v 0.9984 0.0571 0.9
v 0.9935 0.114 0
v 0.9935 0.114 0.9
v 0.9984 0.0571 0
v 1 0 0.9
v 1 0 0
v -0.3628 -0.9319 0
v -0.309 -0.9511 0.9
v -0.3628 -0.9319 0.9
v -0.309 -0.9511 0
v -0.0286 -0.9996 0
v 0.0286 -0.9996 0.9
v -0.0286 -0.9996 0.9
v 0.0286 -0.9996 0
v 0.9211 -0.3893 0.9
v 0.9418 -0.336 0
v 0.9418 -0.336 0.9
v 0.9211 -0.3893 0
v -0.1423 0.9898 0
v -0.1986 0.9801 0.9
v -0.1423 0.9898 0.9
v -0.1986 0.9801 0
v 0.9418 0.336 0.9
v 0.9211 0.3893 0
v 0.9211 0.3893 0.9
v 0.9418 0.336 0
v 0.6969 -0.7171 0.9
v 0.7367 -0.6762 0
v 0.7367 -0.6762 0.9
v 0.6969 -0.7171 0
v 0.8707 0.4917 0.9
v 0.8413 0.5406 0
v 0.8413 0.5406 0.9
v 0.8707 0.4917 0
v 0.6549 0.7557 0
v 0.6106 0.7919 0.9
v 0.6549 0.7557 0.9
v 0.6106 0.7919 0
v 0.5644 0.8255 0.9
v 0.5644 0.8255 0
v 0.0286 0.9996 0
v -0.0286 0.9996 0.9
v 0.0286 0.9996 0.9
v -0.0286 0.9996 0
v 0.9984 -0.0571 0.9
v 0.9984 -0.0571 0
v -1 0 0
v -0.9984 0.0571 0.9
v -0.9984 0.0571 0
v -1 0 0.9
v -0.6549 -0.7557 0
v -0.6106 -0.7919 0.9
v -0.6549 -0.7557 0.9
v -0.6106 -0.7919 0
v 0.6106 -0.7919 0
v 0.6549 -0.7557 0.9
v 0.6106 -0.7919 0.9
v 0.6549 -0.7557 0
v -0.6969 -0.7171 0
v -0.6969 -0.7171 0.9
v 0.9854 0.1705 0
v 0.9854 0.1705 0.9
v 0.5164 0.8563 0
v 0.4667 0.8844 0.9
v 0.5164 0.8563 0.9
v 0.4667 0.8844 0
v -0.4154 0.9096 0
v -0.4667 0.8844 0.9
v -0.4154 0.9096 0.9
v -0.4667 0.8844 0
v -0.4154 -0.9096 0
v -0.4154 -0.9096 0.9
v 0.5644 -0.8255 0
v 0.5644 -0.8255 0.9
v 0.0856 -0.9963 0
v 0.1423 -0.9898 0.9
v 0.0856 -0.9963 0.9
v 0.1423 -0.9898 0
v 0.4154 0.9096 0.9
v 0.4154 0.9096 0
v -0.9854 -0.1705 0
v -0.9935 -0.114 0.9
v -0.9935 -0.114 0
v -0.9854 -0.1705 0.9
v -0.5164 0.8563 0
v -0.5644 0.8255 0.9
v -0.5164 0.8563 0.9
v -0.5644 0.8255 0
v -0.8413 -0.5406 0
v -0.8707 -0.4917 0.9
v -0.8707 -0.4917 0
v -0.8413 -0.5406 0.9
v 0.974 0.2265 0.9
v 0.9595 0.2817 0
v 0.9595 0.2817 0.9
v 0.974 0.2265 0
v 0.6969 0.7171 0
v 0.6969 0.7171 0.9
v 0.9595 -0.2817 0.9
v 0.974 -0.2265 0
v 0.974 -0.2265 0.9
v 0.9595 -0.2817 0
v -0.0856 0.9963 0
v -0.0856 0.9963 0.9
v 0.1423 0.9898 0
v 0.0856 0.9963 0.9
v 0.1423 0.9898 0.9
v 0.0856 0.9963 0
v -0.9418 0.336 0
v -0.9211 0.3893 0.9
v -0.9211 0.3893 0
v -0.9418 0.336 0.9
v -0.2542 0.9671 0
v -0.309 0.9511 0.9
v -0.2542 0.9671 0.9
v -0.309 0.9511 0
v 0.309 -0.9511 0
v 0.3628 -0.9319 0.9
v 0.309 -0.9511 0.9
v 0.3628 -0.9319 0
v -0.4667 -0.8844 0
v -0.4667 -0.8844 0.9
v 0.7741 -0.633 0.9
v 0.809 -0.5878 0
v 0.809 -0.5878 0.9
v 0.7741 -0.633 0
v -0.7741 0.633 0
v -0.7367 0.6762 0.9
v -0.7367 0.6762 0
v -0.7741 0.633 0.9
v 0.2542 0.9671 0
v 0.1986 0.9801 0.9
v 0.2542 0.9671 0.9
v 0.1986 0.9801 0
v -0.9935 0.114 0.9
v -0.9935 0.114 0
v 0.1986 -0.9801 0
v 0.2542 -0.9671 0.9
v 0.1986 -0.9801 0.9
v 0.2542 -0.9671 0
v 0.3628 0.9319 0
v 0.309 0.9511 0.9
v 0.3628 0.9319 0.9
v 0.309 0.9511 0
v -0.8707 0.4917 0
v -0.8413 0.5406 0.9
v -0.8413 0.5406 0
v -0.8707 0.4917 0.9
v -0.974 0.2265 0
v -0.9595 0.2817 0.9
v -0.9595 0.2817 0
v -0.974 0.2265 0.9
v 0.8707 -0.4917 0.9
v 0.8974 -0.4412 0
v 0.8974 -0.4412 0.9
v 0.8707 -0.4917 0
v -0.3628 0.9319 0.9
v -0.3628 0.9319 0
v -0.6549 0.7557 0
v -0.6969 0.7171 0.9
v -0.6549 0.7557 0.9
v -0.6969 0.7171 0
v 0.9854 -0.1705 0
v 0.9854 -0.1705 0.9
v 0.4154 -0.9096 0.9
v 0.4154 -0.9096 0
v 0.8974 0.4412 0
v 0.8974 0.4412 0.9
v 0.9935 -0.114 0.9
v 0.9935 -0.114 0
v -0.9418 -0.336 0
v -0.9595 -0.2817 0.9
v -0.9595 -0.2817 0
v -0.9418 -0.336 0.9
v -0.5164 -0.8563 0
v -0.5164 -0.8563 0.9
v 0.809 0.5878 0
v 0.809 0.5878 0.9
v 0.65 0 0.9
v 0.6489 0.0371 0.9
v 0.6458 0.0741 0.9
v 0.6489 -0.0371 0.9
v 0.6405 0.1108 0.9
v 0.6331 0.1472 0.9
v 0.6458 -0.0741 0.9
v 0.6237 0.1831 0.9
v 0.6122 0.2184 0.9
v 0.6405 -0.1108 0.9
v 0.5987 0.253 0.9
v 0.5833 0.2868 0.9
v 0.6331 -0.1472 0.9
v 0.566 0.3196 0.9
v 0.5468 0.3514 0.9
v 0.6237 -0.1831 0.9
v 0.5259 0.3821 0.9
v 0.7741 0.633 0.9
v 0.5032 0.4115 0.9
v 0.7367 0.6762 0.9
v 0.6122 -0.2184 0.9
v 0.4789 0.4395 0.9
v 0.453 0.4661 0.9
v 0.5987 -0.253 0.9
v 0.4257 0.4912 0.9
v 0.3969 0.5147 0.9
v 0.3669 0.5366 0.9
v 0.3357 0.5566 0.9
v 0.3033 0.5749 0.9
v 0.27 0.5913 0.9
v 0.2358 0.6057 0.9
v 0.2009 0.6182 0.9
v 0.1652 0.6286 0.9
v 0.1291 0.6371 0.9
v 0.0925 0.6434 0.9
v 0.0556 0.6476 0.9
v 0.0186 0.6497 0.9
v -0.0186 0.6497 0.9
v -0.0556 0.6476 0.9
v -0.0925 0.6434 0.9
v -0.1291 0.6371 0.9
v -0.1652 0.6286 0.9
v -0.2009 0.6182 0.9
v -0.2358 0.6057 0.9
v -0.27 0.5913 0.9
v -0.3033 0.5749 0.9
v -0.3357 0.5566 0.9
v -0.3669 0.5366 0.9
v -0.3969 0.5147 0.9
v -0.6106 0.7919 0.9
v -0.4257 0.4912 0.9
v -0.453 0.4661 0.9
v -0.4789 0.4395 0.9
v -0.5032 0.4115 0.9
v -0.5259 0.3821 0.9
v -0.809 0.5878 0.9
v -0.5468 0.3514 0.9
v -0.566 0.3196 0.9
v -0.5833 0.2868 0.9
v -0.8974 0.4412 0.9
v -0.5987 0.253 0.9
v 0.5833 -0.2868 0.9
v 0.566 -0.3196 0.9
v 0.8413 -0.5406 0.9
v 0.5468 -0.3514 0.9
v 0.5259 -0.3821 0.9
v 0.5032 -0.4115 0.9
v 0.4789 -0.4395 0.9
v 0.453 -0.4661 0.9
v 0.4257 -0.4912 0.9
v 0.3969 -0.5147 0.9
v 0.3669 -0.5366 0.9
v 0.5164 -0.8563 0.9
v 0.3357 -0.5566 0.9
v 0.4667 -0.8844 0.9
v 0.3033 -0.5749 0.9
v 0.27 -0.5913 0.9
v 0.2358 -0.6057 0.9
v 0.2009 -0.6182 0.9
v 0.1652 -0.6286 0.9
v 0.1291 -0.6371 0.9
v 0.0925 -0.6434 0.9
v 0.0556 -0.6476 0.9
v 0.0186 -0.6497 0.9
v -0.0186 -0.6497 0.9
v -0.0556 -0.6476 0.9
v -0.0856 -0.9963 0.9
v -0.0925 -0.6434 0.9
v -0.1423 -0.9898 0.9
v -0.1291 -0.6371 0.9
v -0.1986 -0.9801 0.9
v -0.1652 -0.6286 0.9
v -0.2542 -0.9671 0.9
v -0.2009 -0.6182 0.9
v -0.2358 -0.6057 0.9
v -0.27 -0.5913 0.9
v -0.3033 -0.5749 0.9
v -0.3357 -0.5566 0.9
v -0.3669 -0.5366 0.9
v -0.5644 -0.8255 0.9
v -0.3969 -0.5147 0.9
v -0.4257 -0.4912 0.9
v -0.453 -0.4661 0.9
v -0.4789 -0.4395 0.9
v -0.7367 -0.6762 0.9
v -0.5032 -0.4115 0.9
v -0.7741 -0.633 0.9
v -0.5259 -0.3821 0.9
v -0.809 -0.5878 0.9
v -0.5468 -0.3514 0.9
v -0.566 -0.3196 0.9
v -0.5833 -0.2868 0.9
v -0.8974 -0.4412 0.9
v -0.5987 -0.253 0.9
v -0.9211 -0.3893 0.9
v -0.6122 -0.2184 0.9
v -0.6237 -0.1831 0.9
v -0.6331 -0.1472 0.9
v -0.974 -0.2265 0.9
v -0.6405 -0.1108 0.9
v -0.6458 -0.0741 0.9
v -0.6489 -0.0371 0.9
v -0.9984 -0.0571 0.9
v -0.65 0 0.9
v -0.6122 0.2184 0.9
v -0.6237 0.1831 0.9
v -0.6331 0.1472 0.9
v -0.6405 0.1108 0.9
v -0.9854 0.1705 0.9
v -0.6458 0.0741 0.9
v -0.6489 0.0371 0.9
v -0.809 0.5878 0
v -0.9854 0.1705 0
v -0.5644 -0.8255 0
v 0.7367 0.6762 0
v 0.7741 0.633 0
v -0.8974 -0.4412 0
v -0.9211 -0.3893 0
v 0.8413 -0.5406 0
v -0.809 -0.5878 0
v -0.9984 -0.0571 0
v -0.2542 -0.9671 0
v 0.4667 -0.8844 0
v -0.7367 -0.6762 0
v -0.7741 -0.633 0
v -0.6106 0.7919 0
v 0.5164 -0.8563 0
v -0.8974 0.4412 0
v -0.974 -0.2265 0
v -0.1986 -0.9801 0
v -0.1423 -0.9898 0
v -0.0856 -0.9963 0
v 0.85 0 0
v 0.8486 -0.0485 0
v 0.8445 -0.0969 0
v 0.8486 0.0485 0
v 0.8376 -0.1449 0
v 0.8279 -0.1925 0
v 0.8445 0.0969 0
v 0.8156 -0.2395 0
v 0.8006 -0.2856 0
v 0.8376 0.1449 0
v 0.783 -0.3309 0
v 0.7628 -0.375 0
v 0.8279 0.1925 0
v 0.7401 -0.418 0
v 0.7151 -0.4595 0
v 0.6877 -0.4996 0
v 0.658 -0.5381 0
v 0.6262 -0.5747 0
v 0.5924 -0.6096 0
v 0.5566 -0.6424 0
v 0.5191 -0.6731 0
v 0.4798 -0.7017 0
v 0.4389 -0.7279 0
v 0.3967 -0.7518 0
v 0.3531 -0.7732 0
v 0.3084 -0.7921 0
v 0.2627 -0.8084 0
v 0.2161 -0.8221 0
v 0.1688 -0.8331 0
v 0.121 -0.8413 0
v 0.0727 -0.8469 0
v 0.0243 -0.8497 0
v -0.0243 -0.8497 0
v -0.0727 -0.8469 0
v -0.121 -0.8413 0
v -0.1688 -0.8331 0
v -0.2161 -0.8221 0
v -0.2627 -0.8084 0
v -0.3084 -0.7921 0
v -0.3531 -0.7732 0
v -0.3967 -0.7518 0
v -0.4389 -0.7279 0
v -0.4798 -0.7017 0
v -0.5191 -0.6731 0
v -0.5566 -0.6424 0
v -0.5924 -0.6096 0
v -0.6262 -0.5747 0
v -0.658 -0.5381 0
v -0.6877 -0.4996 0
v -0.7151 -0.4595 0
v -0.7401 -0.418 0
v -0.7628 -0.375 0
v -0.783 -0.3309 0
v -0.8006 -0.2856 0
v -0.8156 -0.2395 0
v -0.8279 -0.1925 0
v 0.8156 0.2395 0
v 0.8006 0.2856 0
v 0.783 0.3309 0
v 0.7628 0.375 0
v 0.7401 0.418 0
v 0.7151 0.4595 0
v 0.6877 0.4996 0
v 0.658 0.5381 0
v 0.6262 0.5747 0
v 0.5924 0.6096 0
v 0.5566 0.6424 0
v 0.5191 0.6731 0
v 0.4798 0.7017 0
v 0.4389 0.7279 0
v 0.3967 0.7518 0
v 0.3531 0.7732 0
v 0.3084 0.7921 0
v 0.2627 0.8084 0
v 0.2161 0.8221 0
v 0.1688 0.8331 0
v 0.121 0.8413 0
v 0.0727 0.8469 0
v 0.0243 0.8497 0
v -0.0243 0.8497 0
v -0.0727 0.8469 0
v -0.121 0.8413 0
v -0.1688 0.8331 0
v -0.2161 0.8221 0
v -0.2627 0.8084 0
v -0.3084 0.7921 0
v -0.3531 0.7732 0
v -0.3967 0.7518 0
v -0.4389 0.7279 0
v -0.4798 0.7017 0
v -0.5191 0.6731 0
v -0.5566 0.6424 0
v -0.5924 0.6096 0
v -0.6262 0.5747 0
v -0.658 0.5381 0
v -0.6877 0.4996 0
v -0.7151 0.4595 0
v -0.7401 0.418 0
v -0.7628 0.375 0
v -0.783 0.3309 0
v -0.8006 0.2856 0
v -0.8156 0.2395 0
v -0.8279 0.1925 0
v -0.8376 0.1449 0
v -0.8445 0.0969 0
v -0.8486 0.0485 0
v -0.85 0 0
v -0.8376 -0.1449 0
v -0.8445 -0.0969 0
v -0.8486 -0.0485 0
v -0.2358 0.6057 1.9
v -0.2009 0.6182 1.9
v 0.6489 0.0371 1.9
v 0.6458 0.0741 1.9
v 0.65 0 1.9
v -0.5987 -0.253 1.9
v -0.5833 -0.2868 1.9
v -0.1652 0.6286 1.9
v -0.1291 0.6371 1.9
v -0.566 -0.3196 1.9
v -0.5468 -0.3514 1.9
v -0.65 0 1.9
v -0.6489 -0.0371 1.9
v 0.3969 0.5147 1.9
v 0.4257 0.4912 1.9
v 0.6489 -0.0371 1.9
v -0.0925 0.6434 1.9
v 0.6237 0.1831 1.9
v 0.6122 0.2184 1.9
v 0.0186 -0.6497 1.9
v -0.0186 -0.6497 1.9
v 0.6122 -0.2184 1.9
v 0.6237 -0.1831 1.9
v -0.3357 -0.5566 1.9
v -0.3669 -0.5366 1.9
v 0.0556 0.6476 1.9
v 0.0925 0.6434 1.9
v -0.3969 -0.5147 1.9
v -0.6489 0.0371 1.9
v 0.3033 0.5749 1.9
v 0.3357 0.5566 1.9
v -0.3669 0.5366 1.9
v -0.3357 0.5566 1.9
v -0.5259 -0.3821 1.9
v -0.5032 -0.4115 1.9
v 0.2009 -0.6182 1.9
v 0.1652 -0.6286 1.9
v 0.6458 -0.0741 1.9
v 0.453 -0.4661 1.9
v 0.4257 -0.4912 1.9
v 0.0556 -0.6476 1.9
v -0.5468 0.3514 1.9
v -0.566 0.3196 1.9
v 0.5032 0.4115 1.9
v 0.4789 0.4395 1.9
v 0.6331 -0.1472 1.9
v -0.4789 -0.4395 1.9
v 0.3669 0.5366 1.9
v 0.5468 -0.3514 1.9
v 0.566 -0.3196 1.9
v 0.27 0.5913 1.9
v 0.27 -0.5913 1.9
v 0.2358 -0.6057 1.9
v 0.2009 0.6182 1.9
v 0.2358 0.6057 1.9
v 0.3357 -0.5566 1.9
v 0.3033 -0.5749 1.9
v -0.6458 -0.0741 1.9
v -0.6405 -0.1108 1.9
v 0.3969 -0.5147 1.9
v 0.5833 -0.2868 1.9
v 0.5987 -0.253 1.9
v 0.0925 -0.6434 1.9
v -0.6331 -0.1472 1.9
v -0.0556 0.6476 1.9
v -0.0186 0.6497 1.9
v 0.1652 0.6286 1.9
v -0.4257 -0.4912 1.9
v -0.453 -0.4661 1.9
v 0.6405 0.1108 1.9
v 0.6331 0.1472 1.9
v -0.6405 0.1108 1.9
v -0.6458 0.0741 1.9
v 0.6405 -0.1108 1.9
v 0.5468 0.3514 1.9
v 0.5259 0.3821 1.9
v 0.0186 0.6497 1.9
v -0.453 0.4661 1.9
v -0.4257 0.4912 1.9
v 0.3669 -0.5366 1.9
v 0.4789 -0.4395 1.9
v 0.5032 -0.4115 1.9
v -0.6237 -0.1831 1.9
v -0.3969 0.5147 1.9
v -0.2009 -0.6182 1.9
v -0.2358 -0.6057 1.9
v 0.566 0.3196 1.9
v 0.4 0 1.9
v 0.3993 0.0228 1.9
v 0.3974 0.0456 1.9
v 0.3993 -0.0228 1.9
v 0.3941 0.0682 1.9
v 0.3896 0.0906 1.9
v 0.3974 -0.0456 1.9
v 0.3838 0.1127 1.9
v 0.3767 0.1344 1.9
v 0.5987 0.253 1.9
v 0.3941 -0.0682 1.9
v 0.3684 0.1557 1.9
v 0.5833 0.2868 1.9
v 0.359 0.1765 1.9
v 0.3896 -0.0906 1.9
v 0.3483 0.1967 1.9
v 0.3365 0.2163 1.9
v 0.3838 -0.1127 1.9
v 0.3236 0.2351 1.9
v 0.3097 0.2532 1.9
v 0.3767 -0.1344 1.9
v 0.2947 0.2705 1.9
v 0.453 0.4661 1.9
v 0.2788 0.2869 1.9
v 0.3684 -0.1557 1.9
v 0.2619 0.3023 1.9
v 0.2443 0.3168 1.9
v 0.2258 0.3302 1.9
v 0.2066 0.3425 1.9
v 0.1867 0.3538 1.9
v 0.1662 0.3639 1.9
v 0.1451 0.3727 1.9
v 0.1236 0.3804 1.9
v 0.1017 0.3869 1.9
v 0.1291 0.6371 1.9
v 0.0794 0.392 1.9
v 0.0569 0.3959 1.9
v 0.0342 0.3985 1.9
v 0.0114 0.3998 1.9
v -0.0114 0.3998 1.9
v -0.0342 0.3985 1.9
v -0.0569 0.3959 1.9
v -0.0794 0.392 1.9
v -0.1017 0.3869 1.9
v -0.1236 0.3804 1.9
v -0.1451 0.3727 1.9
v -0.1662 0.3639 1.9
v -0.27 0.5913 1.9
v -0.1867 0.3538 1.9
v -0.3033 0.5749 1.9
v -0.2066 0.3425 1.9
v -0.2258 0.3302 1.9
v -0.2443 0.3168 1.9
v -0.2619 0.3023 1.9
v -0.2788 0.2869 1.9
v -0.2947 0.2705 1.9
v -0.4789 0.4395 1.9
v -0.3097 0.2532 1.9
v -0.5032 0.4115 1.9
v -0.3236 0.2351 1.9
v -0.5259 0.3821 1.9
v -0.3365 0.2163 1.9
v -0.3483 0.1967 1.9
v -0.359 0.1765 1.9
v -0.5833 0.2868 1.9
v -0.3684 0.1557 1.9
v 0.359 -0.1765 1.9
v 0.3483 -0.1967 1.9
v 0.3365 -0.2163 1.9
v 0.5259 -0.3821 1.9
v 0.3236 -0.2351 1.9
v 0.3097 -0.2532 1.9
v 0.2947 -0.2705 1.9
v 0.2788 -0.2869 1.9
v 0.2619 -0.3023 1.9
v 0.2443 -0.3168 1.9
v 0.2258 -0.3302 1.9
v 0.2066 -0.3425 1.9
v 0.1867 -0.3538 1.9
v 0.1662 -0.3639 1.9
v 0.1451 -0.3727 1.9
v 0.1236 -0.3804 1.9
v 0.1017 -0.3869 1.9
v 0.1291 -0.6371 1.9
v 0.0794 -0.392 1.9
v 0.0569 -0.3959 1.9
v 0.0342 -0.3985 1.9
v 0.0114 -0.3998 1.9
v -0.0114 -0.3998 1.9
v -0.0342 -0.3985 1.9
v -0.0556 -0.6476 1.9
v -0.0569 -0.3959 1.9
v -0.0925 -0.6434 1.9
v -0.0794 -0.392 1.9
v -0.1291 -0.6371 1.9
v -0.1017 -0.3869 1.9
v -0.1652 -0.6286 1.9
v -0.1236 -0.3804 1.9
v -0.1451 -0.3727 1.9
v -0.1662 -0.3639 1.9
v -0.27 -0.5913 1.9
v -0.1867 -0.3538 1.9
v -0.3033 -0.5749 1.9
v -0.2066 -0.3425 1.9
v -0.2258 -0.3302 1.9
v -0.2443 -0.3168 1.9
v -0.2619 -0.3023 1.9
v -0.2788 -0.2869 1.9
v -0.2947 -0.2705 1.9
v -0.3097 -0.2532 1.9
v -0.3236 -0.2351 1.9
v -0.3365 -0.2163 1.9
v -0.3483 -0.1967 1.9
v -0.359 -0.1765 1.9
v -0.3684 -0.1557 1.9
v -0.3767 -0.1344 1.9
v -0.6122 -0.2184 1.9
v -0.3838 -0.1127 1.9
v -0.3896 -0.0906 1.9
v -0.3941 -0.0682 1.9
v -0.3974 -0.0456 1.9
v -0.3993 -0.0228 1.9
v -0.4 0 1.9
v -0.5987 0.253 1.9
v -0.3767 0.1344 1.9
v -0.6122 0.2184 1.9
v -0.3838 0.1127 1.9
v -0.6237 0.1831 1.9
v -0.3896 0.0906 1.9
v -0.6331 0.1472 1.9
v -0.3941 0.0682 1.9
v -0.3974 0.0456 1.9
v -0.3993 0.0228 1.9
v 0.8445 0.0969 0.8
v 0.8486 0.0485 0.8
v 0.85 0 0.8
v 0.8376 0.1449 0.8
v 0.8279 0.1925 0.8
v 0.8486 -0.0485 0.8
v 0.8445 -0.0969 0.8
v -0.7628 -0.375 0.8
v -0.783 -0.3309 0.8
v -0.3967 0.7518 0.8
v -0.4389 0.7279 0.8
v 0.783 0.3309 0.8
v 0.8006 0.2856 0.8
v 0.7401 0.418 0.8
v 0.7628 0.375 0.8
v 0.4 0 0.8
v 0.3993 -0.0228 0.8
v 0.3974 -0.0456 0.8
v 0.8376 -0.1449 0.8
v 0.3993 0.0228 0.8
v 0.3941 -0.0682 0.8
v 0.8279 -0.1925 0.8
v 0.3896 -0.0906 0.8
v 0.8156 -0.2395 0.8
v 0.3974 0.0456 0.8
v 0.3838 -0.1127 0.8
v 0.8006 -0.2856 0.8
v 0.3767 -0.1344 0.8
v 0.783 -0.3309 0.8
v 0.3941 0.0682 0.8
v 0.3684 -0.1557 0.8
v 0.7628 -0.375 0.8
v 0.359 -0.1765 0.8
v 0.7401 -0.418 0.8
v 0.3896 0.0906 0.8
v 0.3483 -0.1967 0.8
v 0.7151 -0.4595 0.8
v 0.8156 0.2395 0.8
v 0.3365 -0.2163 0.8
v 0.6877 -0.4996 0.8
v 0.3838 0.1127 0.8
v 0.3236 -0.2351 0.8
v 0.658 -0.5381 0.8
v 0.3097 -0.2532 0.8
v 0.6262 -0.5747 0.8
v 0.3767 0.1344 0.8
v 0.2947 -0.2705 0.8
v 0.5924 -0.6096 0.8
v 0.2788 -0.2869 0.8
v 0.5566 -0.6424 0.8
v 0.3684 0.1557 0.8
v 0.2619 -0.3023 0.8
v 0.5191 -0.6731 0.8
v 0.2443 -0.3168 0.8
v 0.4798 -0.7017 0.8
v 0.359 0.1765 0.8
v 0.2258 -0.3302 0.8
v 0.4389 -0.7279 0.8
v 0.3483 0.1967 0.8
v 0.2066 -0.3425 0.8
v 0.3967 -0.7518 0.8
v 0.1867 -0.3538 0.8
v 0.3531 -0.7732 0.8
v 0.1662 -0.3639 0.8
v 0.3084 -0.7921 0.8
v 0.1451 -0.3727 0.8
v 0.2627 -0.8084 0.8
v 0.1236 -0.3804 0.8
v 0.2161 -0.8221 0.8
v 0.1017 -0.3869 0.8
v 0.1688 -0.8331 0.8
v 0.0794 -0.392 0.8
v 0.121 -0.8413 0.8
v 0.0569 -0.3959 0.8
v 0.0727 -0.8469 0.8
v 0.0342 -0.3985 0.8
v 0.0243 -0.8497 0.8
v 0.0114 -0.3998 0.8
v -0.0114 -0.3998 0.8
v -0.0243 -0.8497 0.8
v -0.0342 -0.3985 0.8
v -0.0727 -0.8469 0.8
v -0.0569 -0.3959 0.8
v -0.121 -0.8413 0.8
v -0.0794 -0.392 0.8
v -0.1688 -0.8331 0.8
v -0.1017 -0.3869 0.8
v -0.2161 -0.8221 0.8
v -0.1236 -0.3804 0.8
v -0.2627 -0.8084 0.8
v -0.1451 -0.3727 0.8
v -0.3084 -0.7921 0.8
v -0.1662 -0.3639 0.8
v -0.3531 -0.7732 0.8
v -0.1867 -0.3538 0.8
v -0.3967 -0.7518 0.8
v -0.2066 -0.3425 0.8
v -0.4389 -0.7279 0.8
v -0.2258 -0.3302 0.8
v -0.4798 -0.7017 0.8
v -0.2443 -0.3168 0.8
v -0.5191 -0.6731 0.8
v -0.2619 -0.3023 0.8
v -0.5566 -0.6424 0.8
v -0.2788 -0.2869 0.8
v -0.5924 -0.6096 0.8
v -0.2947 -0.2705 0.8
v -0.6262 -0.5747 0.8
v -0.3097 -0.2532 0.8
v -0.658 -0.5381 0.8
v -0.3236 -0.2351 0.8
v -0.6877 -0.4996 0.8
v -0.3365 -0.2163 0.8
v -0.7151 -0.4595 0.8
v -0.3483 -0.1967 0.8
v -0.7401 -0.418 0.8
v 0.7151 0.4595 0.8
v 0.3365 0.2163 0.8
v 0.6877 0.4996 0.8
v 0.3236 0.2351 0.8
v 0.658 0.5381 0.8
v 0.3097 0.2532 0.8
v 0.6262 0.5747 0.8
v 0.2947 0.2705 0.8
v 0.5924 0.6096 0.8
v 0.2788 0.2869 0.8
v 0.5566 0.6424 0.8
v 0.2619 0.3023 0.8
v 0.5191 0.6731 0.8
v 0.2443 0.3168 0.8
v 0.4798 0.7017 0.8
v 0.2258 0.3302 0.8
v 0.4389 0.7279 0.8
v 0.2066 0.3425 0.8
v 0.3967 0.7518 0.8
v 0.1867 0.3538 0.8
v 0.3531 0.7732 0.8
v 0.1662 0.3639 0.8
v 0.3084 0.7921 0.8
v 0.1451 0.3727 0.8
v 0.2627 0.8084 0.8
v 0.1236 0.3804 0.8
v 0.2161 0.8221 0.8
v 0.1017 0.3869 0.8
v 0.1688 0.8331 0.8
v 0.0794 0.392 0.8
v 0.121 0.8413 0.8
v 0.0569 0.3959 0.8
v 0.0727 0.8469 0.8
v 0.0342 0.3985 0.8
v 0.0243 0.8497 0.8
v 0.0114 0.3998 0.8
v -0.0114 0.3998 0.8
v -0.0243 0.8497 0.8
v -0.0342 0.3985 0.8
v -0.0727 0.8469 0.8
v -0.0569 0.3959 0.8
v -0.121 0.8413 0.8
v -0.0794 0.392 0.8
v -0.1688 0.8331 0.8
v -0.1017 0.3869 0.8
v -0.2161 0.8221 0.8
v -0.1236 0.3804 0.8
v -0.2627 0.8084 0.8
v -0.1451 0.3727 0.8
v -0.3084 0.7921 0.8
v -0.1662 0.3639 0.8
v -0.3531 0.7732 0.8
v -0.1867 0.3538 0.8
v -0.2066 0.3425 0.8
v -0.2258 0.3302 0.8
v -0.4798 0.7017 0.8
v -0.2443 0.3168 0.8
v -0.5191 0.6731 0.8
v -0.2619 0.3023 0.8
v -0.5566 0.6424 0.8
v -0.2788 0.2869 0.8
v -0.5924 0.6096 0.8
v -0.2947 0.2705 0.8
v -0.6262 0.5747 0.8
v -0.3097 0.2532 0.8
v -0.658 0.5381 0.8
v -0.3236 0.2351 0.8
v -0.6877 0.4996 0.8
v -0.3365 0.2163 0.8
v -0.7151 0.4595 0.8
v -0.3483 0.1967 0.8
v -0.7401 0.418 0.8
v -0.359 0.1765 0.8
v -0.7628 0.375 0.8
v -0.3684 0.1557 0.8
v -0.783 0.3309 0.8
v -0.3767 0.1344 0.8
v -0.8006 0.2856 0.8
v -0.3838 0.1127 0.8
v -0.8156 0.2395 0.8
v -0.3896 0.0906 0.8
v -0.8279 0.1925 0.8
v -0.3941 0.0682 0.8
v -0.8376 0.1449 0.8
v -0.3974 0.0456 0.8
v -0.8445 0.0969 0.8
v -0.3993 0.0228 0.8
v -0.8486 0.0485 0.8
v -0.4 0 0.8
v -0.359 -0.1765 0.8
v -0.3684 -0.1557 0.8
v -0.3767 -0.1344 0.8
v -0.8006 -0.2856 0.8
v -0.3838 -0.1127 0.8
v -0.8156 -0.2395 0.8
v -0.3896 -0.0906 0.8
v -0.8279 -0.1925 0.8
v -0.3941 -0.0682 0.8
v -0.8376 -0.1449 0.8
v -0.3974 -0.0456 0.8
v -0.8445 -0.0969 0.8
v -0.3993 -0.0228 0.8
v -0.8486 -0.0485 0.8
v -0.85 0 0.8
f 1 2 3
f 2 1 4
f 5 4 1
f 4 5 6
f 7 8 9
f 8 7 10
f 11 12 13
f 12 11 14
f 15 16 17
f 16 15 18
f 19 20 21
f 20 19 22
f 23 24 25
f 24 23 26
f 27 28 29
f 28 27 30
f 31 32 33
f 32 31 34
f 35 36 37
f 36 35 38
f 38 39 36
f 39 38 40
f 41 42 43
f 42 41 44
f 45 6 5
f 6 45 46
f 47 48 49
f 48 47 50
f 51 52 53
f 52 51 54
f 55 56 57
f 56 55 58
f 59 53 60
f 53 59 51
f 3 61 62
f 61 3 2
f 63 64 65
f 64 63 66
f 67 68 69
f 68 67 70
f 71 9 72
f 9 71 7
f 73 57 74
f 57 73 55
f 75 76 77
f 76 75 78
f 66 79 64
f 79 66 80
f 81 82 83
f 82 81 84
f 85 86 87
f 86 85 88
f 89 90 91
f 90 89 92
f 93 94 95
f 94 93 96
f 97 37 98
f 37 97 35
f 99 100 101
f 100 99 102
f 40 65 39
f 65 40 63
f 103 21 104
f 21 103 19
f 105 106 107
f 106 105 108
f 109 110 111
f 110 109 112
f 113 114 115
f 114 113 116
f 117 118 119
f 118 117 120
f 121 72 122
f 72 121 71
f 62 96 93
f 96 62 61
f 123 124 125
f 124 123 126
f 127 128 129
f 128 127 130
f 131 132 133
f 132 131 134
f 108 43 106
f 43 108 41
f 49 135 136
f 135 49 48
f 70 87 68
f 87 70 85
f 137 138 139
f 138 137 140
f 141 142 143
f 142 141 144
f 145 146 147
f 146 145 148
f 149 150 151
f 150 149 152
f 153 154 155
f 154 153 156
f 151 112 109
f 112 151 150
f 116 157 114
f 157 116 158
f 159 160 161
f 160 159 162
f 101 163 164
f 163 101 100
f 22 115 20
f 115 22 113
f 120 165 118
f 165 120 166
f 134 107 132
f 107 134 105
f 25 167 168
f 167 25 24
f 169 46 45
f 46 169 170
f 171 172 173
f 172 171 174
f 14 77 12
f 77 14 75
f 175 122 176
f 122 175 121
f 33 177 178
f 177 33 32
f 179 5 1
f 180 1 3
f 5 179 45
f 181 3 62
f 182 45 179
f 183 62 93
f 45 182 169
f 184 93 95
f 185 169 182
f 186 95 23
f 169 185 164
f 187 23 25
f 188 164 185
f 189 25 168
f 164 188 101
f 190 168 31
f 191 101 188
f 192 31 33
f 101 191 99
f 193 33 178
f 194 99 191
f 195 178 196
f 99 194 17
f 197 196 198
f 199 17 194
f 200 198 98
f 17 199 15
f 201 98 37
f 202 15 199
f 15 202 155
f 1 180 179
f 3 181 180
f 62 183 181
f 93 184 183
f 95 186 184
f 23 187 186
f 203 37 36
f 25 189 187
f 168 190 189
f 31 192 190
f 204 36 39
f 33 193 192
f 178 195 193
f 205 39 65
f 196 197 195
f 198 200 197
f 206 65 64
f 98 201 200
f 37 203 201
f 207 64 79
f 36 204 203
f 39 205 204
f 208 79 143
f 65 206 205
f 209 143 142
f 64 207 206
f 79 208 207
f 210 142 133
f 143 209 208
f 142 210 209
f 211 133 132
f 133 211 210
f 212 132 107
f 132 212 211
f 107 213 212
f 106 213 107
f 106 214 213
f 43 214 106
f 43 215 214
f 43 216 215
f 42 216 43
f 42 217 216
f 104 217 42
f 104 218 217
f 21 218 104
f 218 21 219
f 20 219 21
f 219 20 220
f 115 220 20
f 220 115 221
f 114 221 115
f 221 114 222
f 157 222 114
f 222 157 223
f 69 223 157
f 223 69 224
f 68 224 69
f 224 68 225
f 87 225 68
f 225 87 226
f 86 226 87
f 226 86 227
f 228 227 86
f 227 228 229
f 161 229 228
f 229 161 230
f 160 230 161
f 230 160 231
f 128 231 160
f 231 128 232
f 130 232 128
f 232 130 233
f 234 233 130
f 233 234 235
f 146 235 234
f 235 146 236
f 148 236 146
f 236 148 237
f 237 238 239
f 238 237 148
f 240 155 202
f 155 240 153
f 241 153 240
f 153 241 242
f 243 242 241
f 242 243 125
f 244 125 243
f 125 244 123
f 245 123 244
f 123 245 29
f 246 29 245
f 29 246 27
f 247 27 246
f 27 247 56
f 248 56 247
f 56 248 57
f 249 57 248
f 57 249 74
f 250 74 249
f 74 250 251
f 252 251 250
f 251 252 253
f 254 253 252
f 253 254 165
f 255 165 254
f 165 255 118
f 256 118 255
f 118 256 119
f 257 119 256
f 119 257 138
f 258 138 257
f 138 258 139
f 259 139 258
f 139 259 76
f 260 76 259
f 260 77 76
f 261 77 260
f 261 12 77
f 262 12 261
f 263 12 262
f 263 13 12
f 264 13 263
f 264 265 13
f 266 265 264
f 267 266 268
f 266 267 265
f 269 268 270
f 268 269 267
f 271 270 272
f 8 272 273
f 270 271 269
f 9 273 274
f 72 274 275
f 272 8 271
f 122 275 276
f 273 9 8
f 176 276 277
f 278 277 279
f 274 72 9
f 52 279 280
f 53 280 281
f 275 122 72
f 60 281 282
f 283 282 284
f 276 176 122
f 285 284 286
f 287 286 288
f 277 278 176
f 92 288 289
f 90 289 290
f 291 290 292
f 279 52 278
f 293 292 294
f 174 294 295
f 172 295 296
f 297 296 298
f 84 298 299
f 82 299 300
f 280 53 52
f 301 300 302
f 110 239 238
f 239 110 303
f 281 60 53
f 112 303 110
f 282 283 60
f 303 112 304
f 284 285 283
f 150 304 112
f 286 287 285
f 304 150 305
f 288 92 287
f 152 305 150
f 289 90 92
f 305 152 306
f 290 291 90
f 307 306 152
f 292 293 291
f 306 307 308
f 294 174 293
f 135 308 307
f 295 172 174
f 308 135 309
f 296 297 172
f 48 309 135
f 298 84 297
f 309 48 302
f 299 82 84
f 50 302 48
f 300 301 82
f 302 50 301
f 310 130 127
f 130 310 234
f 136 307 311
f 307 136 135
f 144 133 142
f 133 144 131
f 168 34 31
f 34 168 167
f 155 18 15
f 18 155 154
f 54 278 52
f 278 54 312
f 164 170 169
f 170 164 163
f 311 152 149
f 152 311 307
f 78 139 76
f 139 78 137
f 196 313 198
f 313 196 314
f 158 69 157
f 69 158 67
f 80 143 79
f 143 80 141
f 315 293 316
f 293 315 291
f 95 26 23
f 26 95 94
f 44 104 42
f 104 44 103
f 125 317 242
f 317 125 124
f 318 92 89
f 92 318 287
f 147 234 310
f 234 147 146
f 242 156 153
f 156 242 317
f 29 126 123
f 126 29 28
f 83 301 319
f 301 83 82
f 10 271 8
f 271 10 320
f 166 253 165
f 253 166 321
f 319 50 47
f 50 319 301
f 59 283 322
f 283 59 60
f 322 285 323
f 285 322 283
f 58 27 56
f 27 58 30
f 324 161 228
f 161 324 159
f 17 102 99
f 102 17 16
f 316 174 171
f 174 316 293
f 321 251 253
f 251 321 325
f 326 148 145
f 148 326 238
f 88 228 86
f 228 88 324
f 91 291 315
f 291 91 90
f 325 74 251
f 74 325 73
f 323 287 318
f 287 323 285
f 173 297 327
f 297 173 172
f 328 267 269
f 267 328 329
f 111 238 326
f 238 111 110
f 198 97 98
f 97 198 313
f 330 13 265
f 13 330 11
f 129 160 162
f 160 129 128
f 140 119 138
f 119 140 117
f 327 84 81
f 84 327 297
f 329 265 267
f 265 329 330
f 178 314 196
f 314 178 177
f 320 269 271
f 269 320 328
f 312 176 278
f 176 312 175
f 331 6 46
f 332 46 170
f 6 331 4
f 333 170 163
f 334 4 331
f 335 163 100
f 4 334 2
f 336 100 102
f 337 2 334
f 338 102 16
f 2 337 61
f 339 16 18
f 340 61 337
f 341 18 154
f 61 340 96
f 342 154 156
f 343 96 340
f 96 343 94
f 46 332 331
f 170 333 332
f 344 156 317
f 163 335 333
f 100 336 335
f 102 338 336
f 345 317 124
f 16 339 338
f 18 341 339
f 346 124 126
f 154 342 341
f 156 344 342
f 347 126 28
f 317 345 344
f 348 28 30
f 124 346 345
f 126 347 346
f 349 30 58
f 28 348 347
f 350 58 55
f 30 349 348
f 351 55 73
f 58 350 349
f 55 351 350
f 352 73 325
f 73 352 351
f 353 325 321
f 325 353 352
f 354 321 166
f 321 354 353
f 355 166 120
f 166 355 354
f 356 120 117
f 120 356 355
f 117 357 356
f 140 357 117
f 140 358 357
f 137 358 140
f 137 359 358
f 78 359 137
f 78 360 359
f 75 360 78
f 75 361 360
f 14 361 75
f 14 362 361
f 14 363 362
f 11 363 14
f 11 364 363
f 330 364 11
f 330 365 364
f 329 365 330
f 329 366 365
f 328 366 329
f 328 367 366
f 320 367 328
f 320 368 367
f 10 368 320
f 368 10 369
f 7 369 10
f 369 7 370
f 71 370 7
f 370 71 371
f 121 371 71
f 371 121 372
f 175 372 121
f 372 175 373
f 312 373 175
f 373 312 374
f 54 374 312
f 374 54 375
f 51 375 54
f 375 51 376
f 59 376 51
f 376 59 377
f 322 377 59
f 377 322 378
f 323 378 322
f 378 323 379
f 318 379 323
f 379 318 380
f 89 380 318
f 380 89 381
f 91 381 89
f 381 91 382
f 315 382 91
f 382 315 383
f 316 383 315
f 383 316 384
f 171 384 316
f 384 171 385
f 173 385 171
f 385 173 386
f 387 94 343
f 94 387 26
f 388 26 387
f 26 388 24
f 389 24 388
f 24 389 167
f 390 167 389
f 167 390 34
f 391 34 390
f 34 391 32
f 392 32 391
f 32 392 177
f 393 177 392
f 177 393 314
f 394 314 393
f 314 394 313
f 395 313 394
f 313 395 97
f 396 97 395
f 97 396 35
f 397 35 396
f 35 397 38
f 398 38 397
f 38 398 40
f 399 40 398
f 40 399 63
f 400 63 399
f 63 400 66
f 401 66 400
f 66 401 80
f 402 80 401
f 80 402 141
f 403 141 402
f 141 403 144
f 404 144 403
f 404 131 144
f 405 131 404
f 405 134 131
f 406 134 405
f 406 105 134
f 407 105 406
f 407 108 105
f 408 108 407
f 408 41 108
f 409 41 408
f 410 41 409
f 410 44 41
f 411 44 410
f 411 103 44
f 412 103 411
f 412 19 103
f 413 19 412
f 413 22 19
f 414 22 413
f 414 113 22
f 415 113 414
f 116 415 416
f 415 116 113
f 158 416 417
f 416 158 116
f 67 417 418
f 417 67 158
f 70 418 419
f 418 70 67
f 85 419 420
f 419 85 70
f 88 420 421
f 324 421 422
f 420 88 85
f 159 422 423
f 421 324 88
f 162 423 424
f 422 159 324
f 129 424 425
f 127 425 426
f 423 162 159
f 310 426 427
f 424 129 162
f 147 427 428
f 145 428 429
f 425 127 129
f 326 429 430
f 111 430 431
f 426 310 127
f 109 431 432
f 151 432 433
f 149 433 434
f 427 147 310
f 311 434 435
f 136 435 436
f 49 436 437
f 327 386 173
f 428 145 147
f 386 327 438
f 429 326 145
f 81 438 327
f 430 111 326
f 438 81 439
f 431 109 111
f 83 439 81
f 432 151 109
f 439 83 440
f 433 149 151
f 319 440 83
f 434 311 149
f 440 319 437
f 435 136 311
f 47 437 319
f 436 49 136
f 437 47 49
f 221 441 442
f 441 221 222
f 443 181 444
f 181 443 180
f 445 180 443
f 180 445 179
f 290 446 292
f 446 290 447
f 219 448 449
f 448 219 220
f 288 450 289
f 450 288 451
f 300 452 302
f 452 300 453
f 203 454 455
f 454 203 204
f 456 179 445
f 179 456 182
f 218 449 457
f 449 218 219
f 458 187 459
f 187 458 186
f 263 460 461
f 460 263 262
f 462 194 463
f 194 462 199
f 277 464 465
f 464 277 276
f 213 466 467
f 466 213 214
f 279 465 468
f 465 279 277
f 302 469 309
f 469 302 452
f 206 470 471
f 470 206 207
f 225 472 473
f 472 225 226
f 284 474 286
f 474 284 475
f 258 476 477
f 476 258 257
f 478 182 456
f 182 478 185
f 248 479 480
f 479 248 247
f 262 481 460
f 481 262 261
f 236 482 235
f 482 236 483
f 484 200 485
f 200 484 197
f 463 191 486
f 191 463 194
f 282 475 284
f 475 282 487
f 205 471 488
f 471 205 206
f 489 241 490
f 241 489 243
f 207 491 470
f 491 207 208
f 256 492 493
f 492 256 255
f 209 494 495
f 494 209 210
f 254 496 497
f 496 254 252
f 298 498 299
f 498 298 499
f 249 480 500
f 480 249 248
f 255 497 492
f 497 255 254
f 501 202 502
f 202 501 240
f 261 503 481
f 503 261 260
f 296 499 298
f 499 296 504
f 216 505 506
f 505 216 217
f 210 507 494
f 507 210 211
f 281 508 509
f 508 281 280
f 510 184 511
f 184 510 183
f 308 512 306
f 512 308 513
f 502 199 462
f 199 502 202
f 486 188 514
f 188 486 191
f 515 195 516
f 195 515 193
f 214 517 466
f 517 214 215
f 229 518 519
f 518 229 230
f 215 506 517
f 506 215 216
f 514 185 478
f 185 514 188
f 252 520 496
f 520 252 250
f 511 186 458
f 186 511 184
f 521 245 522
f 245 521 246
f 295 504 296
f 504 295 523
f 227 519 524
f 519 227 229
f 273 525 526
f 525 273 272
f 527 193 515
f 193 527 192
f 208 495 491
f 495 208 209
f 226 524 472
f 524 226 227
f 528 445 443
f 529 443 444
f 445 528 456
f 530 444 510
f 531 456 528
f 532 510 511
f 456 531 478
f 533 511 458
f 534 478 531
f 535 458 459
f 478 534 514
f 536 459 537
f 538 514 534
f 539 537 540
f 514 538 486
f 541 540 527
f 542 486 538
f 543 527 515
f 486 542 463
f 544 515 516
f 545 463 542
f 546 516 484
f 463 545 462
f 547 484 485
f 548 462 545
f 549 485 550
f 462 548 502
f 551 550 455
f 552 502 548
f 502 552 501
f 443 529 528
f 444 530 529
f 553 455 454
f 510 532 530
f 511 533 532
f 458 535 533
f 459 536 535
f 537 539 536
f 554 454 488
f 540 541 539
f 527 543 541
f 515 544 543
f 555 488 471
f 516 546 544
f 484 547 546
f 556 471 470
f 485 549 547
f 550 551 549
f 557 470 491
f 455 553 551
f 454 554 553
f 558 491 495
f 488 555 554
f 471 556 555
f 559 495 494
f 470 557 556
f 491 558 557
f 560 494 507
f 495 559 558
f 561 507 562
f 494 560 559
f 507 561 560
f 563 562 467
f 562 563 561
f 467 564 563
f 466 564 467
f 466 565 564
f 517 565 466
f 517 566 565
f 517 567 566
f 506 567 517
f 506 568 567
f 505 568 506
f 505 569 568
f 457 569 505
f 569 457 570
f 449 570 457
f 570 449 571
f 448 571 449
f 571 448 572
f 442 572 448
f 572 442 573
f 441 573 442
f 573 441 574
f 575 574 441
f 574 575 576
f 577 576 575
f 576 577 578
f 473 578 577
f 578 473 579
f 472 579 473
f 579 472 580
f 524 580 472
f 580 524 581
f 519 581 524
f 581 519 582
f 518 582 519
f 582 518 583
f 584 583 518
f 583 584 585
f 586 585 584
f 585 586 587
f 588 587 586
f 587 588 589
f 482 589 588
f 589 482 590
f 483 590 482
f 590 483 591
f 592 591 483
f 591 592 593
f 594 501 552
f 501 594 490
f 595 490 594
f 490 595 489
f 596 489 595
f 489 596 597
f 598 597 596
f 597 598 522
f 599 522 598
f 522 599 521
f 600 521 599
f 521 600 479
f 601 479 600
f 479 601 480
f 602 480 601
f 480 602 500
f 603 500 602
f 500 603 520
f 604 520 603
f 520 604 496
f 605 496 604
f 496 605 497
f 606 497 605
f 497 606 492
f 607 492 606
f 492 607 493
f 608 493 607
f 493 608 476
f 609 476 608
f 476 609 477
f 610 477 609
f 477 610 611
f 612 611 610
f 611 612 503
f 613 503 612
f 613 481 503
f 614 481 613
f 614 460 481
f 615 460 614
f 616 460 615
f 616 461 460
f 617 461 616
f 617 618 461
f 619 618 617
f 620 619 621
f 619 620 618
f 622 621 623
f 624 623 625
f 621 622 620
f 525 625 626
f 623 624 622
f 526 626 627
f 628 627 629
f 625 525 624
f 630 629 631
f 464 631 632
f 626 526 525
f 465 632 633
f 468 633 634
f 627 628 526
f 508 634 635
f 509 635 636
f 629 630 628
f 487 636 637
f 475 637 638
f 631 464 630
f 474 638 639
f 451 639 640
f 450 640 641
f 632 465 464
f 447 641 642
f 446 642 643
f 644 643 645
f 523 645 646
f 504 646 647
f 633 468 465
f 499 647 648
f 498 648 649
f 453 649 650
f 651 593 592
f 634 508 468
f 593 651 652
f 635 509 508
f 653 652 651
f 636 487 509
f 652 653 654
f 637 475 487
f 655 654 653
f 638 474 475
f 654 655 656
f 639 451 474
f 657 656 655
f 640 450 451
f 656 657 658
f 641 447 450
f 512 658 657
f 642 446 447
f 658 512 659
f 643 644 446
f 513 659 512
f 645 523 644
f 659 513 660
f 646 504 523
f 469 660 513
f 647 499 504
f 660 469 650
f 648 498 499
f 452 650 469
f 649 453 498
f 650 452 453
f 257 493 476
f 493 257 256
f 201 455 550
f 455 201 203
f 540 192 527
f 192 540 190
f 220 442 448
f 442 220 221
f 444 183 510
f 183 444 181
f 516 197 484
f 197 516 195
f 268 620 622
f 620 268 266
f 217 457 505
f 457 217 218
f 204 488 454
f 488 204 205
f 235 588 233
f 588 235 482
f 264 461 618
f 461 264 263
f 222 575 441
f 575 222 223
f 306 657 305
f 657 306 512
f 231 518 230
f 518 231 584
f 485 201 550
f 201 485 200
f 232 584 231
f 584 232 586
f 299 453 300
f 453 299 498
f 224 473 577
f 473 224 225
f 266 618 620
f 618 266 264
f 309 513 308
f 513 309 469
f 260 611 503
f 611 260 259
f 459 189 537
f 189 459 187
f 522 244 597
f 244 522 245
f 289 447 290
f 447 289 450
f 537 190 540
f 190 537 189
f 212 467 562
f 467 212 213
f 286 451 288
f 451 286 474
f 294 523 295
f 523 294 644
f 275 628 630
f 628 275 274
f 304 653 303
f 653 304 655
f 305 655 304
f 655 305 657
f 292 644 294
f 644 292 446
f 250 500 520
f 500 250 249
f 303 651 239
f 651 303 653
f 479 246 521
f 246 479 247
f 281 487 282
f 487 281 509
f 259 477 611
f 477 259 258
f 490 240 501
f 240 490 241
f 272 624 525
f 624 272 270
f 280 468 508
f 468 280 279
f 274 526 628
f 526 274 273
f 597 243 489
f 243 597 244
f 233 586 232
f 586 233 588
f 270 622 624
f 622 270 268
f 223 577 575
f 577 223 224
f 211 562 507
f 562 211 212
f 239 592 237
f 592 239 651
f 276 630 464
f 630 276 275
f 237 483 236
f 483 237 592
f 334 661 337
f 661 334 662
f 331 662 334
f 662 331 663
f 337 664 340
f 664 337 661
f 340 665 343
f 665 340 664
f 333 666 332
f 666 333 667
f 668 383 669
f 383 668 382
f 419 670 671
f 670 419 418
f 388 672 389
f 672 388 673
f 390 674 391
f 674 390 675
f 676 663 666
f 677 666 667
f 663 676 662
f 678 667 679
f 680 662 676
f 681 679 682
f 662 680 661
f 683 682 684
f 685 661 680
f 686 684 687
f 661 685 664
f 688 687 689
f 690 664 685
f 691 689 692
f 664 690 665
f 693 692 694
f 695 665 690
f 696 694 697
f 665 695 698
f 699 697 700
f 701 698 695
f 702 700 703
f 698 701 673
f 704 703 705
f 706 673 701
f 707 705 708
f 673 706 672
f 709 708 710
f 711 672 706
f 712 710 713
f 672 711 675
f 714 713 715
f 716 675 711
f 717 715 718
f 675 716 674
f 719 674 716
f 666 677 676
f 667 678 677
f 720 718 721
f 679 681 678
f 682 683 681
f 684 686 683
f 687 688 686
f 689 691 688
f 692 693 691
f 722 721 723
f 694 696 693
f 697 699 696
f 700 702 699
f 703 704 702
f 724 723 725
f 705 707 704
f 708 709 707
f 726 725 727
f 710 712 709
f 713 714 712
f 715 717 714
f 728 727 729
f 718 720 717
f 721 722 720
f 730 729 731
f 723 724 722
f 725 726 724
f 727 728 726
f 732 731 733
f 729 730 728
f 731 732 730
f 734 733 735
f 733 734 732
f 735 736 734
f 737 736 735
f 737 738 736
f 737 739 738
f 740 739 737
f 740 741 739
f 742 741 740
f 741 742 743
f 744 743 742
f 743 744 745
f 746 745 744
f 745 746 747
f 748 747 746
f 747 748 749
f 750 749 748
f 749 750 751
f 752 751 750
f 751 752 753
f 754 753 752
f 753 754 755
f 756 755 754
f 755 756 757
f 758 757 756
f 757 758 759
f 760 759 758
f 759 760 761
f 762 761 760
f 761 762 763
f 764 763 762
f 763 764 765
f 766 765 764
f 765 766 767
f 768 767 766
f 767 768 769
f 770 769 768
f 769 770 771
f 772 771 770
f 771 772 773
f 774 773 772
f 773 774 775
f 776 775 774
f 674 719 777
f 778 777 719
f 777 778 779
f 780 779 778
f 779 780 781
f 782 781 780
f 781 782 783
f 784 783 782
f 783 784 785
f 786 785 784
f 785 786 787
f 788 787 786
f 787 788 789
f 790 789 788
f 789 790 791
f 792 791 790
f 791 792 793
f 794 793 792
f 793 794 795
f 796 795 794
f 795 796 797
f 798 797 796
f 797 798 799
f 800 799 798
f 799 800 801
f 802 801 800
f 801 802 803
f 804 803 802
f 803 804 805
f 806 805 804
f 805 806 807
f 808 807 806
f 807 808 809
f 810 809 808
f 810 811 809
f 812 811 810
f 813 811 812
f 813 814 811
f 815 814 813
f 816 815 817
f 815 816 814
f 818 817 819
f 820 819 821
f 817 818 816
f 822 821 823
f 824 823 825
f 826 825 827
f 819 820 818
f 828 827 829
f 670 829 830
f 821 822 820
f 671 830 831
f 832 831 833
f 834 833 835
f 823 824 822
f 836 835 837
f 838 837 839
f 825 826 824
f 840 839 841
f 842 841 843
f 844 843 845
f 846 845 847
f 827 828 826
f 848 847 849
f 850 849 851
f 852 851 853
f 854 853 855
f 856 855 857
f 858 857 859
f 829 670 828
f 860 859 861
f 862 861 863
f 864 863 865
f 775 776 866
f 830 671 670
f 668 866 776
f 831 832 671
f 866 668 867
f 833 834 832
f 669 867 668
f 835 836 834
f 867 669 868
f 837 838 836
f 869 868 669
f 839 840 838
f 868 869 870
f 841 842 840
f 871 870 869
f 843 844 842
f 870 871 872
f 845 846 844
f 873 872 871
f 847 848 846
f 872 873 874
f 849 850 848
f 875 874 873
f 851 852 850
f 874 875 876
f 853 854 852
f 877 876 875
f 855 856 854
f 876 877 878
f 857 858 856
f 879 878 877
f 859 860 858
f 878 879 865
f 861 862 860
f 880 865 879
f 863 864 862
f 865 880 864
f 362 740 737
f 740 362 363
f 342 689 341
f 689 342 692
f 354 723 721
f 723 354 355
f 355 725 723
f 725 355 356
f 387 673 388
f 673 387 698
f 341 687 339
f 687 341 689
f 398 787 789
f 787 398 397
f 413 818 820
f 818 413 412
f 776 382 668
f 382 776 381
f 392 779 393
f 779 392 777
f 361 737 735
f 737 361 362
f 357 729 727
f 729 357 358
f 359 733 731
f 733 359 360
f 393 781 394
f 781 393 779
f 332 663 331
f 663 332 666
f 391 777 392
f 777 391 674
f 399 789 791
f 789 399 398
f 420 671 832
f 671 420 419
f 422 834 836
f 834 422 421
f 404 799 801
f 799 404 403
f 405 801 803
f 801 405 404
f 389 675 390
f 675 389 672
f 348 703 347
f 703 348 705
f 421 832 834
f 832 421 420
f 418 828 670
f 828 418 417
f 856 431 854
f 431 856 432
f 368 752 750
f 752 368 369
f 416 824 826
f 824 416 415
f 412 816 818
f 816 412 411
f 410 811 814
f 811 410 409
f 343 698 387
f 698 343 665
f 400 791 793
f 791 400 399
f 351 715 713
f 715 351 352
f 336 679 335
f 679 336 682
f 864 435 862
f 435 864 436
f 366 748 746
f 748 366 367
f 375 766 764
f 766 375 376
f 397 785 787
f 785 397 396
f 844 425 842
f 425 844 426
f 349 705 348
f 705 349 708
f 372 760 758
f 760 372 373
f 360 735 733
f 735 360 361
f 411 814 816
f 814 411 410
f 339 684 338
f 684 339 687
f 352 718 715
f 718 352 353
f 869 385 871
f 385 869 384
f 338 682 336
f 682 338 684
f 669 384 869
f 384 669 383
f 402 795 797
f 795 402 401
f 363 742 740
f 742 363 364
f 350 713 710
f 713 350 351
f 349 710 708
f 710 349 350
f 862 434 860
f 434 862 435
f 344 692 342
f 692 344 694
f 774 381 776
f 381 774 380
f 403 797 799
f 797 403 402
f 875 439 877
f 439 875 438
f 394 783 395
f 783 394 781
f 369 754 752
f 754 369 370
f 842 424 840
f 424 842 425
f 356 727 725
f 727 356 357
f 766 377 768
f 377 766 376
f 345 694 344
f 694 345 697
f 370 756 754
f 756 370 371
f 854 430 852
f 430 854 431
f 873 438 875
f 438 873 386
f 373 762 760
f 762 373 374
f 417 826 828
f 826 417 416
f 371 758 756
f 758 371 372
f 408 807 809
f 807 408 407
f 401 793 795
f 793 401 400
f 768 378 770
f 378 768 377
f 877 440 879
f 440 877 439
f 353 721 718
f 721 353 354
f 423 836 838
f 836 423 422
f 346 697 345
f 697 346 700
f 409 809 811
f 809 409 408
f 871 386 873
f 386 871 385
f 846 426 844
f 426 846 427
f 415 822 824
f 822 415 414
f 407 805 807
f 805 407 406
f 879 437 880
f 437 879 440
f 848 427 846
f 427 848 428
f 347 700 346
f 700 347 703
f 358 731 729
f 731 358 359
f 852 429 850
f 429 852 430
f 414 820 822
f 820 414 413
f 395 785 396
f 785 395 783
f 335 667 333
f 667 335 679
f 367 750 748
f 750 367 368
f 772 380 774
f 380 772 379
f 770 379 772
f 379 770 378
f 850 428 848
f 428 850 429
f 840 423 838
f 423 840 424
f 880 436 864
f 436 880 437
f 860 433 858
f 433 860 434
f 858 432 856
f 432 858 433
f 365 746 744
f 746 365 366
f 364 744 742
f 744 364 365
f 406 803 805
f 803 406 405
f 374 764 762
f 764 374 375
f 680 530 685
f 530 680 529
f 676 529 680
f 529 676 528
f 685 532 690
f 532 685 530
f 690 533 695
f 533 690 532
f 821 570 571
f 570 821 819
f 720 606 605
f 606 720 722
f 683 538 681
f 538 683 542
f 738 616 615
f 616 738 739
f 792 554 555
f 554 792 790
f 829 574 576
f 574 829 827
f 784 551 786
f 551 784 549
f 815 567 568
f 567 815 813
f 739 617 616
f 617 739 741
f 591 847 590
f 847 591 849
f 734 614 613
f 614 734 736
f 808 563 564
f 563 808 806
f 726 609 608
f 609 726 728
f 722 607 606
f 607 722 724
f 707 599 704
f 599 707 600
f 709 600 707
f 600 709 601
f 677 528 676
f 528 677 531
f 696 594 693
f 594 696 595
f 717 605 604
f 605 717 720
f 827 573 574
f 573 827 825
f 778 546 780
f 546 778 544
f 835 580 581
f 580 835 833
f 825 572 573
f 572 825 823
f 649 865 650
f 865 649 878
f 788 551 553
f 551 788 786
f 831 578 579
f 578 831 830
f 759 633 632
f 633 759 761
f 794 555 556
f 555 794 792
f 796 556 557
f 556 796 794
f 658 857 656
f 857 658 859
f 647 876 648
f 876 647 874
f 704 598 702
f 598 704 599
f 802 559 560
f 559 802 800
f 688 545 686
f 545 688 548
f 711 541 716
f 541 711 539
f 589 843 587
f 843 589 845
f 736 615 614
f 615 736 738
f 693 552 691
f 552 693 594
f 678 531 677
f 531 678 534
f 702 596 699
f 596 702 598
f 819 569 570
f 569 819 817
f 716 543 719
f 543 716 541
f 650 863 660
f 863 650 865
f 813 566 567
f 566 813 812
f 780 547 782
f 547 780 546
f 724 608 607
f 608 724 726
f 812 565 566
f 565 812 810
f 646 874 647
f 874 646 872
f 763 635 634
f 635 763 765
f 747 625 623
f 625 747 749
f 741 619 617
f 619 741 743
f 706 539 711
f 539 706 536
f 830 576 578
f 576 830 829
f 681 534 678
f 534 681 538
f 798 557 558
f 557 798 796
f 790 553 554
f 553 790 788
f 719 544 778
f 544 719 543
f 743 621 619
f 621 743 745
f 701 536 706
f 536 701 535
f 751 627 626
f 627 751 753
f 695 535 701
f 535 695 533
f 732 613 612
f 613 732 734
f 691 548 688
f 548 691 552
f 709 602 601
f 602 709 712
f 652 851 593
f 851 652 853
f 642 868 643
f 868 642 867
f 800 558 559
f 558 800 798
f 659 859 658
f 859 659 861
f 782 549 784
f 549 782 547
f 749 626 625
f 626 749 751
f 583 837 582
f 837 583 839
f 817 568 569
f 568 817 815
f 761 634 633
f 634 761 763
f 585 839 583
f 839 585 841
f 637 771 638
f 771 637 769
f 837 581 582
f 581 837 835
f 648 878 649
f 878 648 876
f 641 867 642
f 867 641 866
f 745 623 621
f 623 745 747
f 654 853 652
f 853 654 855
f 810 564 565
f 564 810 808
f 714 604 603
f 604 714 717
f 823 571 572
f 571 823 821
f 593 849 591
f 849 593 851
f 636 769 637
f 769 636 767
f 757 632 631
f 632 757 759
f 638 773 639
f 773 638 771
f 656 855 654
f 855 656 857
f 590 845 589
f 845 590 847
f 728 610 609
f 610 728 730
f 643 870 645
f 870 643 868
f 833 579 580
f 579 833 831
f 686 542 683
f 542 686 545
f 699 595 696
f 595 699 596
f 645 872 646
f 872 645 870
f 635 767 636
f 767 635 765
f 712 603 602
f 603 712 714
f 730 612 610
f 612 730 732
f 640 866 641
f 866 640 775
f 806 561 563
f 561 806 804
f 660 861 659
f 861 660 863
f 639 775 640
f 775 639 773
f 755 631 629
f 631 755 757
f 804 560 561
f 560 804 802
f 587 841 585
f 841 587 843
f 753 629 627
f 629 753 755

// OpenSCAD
include <MCAD/screw.scad>

femaleSleeveOuterDiameter=2;
femaleSleeveCavityDepth=0.8;
boreDiameter=0.8;
ceilingThickness=0.1;

femaleThreadMinorDiameter=1.7;
femaleThreadMajorDiameter=1.8;
femaleThreadPitch=0.2;
femaleThreadNumberOfStarts=1;

maleThreadMinorDiameter=1.3;
maleThreadMajorDiameter=1.4;
maleThreadPitch=0.14;
maleThreadNumberOfStarts=1;

maleSleeveOuterDiameter=1.3;
maleSleeveHeight=1;





$fn=110;



difference()
{
    union()
    {
        cylinder(r=femaleSleeveOuterDiameter/2, h=femaleSleeveCavityDepth+ceilingThickness);
        translate([0,0,femaleSleeveCavityDepth+ceilingThickness]) cylinder(r=maleThreadMinorDiameter/2, h=maleSleeveHeight);
    }
    union()
    {
        cylinder(r=femaleThreadMinorDiameter/2, h=femaleSleeveCavityDepth);
        cylinder(r=boreDiameter/2, h=femaleSleeveCavityDepth + ceilingThickness + maleSleeveHeight);
    }
}
